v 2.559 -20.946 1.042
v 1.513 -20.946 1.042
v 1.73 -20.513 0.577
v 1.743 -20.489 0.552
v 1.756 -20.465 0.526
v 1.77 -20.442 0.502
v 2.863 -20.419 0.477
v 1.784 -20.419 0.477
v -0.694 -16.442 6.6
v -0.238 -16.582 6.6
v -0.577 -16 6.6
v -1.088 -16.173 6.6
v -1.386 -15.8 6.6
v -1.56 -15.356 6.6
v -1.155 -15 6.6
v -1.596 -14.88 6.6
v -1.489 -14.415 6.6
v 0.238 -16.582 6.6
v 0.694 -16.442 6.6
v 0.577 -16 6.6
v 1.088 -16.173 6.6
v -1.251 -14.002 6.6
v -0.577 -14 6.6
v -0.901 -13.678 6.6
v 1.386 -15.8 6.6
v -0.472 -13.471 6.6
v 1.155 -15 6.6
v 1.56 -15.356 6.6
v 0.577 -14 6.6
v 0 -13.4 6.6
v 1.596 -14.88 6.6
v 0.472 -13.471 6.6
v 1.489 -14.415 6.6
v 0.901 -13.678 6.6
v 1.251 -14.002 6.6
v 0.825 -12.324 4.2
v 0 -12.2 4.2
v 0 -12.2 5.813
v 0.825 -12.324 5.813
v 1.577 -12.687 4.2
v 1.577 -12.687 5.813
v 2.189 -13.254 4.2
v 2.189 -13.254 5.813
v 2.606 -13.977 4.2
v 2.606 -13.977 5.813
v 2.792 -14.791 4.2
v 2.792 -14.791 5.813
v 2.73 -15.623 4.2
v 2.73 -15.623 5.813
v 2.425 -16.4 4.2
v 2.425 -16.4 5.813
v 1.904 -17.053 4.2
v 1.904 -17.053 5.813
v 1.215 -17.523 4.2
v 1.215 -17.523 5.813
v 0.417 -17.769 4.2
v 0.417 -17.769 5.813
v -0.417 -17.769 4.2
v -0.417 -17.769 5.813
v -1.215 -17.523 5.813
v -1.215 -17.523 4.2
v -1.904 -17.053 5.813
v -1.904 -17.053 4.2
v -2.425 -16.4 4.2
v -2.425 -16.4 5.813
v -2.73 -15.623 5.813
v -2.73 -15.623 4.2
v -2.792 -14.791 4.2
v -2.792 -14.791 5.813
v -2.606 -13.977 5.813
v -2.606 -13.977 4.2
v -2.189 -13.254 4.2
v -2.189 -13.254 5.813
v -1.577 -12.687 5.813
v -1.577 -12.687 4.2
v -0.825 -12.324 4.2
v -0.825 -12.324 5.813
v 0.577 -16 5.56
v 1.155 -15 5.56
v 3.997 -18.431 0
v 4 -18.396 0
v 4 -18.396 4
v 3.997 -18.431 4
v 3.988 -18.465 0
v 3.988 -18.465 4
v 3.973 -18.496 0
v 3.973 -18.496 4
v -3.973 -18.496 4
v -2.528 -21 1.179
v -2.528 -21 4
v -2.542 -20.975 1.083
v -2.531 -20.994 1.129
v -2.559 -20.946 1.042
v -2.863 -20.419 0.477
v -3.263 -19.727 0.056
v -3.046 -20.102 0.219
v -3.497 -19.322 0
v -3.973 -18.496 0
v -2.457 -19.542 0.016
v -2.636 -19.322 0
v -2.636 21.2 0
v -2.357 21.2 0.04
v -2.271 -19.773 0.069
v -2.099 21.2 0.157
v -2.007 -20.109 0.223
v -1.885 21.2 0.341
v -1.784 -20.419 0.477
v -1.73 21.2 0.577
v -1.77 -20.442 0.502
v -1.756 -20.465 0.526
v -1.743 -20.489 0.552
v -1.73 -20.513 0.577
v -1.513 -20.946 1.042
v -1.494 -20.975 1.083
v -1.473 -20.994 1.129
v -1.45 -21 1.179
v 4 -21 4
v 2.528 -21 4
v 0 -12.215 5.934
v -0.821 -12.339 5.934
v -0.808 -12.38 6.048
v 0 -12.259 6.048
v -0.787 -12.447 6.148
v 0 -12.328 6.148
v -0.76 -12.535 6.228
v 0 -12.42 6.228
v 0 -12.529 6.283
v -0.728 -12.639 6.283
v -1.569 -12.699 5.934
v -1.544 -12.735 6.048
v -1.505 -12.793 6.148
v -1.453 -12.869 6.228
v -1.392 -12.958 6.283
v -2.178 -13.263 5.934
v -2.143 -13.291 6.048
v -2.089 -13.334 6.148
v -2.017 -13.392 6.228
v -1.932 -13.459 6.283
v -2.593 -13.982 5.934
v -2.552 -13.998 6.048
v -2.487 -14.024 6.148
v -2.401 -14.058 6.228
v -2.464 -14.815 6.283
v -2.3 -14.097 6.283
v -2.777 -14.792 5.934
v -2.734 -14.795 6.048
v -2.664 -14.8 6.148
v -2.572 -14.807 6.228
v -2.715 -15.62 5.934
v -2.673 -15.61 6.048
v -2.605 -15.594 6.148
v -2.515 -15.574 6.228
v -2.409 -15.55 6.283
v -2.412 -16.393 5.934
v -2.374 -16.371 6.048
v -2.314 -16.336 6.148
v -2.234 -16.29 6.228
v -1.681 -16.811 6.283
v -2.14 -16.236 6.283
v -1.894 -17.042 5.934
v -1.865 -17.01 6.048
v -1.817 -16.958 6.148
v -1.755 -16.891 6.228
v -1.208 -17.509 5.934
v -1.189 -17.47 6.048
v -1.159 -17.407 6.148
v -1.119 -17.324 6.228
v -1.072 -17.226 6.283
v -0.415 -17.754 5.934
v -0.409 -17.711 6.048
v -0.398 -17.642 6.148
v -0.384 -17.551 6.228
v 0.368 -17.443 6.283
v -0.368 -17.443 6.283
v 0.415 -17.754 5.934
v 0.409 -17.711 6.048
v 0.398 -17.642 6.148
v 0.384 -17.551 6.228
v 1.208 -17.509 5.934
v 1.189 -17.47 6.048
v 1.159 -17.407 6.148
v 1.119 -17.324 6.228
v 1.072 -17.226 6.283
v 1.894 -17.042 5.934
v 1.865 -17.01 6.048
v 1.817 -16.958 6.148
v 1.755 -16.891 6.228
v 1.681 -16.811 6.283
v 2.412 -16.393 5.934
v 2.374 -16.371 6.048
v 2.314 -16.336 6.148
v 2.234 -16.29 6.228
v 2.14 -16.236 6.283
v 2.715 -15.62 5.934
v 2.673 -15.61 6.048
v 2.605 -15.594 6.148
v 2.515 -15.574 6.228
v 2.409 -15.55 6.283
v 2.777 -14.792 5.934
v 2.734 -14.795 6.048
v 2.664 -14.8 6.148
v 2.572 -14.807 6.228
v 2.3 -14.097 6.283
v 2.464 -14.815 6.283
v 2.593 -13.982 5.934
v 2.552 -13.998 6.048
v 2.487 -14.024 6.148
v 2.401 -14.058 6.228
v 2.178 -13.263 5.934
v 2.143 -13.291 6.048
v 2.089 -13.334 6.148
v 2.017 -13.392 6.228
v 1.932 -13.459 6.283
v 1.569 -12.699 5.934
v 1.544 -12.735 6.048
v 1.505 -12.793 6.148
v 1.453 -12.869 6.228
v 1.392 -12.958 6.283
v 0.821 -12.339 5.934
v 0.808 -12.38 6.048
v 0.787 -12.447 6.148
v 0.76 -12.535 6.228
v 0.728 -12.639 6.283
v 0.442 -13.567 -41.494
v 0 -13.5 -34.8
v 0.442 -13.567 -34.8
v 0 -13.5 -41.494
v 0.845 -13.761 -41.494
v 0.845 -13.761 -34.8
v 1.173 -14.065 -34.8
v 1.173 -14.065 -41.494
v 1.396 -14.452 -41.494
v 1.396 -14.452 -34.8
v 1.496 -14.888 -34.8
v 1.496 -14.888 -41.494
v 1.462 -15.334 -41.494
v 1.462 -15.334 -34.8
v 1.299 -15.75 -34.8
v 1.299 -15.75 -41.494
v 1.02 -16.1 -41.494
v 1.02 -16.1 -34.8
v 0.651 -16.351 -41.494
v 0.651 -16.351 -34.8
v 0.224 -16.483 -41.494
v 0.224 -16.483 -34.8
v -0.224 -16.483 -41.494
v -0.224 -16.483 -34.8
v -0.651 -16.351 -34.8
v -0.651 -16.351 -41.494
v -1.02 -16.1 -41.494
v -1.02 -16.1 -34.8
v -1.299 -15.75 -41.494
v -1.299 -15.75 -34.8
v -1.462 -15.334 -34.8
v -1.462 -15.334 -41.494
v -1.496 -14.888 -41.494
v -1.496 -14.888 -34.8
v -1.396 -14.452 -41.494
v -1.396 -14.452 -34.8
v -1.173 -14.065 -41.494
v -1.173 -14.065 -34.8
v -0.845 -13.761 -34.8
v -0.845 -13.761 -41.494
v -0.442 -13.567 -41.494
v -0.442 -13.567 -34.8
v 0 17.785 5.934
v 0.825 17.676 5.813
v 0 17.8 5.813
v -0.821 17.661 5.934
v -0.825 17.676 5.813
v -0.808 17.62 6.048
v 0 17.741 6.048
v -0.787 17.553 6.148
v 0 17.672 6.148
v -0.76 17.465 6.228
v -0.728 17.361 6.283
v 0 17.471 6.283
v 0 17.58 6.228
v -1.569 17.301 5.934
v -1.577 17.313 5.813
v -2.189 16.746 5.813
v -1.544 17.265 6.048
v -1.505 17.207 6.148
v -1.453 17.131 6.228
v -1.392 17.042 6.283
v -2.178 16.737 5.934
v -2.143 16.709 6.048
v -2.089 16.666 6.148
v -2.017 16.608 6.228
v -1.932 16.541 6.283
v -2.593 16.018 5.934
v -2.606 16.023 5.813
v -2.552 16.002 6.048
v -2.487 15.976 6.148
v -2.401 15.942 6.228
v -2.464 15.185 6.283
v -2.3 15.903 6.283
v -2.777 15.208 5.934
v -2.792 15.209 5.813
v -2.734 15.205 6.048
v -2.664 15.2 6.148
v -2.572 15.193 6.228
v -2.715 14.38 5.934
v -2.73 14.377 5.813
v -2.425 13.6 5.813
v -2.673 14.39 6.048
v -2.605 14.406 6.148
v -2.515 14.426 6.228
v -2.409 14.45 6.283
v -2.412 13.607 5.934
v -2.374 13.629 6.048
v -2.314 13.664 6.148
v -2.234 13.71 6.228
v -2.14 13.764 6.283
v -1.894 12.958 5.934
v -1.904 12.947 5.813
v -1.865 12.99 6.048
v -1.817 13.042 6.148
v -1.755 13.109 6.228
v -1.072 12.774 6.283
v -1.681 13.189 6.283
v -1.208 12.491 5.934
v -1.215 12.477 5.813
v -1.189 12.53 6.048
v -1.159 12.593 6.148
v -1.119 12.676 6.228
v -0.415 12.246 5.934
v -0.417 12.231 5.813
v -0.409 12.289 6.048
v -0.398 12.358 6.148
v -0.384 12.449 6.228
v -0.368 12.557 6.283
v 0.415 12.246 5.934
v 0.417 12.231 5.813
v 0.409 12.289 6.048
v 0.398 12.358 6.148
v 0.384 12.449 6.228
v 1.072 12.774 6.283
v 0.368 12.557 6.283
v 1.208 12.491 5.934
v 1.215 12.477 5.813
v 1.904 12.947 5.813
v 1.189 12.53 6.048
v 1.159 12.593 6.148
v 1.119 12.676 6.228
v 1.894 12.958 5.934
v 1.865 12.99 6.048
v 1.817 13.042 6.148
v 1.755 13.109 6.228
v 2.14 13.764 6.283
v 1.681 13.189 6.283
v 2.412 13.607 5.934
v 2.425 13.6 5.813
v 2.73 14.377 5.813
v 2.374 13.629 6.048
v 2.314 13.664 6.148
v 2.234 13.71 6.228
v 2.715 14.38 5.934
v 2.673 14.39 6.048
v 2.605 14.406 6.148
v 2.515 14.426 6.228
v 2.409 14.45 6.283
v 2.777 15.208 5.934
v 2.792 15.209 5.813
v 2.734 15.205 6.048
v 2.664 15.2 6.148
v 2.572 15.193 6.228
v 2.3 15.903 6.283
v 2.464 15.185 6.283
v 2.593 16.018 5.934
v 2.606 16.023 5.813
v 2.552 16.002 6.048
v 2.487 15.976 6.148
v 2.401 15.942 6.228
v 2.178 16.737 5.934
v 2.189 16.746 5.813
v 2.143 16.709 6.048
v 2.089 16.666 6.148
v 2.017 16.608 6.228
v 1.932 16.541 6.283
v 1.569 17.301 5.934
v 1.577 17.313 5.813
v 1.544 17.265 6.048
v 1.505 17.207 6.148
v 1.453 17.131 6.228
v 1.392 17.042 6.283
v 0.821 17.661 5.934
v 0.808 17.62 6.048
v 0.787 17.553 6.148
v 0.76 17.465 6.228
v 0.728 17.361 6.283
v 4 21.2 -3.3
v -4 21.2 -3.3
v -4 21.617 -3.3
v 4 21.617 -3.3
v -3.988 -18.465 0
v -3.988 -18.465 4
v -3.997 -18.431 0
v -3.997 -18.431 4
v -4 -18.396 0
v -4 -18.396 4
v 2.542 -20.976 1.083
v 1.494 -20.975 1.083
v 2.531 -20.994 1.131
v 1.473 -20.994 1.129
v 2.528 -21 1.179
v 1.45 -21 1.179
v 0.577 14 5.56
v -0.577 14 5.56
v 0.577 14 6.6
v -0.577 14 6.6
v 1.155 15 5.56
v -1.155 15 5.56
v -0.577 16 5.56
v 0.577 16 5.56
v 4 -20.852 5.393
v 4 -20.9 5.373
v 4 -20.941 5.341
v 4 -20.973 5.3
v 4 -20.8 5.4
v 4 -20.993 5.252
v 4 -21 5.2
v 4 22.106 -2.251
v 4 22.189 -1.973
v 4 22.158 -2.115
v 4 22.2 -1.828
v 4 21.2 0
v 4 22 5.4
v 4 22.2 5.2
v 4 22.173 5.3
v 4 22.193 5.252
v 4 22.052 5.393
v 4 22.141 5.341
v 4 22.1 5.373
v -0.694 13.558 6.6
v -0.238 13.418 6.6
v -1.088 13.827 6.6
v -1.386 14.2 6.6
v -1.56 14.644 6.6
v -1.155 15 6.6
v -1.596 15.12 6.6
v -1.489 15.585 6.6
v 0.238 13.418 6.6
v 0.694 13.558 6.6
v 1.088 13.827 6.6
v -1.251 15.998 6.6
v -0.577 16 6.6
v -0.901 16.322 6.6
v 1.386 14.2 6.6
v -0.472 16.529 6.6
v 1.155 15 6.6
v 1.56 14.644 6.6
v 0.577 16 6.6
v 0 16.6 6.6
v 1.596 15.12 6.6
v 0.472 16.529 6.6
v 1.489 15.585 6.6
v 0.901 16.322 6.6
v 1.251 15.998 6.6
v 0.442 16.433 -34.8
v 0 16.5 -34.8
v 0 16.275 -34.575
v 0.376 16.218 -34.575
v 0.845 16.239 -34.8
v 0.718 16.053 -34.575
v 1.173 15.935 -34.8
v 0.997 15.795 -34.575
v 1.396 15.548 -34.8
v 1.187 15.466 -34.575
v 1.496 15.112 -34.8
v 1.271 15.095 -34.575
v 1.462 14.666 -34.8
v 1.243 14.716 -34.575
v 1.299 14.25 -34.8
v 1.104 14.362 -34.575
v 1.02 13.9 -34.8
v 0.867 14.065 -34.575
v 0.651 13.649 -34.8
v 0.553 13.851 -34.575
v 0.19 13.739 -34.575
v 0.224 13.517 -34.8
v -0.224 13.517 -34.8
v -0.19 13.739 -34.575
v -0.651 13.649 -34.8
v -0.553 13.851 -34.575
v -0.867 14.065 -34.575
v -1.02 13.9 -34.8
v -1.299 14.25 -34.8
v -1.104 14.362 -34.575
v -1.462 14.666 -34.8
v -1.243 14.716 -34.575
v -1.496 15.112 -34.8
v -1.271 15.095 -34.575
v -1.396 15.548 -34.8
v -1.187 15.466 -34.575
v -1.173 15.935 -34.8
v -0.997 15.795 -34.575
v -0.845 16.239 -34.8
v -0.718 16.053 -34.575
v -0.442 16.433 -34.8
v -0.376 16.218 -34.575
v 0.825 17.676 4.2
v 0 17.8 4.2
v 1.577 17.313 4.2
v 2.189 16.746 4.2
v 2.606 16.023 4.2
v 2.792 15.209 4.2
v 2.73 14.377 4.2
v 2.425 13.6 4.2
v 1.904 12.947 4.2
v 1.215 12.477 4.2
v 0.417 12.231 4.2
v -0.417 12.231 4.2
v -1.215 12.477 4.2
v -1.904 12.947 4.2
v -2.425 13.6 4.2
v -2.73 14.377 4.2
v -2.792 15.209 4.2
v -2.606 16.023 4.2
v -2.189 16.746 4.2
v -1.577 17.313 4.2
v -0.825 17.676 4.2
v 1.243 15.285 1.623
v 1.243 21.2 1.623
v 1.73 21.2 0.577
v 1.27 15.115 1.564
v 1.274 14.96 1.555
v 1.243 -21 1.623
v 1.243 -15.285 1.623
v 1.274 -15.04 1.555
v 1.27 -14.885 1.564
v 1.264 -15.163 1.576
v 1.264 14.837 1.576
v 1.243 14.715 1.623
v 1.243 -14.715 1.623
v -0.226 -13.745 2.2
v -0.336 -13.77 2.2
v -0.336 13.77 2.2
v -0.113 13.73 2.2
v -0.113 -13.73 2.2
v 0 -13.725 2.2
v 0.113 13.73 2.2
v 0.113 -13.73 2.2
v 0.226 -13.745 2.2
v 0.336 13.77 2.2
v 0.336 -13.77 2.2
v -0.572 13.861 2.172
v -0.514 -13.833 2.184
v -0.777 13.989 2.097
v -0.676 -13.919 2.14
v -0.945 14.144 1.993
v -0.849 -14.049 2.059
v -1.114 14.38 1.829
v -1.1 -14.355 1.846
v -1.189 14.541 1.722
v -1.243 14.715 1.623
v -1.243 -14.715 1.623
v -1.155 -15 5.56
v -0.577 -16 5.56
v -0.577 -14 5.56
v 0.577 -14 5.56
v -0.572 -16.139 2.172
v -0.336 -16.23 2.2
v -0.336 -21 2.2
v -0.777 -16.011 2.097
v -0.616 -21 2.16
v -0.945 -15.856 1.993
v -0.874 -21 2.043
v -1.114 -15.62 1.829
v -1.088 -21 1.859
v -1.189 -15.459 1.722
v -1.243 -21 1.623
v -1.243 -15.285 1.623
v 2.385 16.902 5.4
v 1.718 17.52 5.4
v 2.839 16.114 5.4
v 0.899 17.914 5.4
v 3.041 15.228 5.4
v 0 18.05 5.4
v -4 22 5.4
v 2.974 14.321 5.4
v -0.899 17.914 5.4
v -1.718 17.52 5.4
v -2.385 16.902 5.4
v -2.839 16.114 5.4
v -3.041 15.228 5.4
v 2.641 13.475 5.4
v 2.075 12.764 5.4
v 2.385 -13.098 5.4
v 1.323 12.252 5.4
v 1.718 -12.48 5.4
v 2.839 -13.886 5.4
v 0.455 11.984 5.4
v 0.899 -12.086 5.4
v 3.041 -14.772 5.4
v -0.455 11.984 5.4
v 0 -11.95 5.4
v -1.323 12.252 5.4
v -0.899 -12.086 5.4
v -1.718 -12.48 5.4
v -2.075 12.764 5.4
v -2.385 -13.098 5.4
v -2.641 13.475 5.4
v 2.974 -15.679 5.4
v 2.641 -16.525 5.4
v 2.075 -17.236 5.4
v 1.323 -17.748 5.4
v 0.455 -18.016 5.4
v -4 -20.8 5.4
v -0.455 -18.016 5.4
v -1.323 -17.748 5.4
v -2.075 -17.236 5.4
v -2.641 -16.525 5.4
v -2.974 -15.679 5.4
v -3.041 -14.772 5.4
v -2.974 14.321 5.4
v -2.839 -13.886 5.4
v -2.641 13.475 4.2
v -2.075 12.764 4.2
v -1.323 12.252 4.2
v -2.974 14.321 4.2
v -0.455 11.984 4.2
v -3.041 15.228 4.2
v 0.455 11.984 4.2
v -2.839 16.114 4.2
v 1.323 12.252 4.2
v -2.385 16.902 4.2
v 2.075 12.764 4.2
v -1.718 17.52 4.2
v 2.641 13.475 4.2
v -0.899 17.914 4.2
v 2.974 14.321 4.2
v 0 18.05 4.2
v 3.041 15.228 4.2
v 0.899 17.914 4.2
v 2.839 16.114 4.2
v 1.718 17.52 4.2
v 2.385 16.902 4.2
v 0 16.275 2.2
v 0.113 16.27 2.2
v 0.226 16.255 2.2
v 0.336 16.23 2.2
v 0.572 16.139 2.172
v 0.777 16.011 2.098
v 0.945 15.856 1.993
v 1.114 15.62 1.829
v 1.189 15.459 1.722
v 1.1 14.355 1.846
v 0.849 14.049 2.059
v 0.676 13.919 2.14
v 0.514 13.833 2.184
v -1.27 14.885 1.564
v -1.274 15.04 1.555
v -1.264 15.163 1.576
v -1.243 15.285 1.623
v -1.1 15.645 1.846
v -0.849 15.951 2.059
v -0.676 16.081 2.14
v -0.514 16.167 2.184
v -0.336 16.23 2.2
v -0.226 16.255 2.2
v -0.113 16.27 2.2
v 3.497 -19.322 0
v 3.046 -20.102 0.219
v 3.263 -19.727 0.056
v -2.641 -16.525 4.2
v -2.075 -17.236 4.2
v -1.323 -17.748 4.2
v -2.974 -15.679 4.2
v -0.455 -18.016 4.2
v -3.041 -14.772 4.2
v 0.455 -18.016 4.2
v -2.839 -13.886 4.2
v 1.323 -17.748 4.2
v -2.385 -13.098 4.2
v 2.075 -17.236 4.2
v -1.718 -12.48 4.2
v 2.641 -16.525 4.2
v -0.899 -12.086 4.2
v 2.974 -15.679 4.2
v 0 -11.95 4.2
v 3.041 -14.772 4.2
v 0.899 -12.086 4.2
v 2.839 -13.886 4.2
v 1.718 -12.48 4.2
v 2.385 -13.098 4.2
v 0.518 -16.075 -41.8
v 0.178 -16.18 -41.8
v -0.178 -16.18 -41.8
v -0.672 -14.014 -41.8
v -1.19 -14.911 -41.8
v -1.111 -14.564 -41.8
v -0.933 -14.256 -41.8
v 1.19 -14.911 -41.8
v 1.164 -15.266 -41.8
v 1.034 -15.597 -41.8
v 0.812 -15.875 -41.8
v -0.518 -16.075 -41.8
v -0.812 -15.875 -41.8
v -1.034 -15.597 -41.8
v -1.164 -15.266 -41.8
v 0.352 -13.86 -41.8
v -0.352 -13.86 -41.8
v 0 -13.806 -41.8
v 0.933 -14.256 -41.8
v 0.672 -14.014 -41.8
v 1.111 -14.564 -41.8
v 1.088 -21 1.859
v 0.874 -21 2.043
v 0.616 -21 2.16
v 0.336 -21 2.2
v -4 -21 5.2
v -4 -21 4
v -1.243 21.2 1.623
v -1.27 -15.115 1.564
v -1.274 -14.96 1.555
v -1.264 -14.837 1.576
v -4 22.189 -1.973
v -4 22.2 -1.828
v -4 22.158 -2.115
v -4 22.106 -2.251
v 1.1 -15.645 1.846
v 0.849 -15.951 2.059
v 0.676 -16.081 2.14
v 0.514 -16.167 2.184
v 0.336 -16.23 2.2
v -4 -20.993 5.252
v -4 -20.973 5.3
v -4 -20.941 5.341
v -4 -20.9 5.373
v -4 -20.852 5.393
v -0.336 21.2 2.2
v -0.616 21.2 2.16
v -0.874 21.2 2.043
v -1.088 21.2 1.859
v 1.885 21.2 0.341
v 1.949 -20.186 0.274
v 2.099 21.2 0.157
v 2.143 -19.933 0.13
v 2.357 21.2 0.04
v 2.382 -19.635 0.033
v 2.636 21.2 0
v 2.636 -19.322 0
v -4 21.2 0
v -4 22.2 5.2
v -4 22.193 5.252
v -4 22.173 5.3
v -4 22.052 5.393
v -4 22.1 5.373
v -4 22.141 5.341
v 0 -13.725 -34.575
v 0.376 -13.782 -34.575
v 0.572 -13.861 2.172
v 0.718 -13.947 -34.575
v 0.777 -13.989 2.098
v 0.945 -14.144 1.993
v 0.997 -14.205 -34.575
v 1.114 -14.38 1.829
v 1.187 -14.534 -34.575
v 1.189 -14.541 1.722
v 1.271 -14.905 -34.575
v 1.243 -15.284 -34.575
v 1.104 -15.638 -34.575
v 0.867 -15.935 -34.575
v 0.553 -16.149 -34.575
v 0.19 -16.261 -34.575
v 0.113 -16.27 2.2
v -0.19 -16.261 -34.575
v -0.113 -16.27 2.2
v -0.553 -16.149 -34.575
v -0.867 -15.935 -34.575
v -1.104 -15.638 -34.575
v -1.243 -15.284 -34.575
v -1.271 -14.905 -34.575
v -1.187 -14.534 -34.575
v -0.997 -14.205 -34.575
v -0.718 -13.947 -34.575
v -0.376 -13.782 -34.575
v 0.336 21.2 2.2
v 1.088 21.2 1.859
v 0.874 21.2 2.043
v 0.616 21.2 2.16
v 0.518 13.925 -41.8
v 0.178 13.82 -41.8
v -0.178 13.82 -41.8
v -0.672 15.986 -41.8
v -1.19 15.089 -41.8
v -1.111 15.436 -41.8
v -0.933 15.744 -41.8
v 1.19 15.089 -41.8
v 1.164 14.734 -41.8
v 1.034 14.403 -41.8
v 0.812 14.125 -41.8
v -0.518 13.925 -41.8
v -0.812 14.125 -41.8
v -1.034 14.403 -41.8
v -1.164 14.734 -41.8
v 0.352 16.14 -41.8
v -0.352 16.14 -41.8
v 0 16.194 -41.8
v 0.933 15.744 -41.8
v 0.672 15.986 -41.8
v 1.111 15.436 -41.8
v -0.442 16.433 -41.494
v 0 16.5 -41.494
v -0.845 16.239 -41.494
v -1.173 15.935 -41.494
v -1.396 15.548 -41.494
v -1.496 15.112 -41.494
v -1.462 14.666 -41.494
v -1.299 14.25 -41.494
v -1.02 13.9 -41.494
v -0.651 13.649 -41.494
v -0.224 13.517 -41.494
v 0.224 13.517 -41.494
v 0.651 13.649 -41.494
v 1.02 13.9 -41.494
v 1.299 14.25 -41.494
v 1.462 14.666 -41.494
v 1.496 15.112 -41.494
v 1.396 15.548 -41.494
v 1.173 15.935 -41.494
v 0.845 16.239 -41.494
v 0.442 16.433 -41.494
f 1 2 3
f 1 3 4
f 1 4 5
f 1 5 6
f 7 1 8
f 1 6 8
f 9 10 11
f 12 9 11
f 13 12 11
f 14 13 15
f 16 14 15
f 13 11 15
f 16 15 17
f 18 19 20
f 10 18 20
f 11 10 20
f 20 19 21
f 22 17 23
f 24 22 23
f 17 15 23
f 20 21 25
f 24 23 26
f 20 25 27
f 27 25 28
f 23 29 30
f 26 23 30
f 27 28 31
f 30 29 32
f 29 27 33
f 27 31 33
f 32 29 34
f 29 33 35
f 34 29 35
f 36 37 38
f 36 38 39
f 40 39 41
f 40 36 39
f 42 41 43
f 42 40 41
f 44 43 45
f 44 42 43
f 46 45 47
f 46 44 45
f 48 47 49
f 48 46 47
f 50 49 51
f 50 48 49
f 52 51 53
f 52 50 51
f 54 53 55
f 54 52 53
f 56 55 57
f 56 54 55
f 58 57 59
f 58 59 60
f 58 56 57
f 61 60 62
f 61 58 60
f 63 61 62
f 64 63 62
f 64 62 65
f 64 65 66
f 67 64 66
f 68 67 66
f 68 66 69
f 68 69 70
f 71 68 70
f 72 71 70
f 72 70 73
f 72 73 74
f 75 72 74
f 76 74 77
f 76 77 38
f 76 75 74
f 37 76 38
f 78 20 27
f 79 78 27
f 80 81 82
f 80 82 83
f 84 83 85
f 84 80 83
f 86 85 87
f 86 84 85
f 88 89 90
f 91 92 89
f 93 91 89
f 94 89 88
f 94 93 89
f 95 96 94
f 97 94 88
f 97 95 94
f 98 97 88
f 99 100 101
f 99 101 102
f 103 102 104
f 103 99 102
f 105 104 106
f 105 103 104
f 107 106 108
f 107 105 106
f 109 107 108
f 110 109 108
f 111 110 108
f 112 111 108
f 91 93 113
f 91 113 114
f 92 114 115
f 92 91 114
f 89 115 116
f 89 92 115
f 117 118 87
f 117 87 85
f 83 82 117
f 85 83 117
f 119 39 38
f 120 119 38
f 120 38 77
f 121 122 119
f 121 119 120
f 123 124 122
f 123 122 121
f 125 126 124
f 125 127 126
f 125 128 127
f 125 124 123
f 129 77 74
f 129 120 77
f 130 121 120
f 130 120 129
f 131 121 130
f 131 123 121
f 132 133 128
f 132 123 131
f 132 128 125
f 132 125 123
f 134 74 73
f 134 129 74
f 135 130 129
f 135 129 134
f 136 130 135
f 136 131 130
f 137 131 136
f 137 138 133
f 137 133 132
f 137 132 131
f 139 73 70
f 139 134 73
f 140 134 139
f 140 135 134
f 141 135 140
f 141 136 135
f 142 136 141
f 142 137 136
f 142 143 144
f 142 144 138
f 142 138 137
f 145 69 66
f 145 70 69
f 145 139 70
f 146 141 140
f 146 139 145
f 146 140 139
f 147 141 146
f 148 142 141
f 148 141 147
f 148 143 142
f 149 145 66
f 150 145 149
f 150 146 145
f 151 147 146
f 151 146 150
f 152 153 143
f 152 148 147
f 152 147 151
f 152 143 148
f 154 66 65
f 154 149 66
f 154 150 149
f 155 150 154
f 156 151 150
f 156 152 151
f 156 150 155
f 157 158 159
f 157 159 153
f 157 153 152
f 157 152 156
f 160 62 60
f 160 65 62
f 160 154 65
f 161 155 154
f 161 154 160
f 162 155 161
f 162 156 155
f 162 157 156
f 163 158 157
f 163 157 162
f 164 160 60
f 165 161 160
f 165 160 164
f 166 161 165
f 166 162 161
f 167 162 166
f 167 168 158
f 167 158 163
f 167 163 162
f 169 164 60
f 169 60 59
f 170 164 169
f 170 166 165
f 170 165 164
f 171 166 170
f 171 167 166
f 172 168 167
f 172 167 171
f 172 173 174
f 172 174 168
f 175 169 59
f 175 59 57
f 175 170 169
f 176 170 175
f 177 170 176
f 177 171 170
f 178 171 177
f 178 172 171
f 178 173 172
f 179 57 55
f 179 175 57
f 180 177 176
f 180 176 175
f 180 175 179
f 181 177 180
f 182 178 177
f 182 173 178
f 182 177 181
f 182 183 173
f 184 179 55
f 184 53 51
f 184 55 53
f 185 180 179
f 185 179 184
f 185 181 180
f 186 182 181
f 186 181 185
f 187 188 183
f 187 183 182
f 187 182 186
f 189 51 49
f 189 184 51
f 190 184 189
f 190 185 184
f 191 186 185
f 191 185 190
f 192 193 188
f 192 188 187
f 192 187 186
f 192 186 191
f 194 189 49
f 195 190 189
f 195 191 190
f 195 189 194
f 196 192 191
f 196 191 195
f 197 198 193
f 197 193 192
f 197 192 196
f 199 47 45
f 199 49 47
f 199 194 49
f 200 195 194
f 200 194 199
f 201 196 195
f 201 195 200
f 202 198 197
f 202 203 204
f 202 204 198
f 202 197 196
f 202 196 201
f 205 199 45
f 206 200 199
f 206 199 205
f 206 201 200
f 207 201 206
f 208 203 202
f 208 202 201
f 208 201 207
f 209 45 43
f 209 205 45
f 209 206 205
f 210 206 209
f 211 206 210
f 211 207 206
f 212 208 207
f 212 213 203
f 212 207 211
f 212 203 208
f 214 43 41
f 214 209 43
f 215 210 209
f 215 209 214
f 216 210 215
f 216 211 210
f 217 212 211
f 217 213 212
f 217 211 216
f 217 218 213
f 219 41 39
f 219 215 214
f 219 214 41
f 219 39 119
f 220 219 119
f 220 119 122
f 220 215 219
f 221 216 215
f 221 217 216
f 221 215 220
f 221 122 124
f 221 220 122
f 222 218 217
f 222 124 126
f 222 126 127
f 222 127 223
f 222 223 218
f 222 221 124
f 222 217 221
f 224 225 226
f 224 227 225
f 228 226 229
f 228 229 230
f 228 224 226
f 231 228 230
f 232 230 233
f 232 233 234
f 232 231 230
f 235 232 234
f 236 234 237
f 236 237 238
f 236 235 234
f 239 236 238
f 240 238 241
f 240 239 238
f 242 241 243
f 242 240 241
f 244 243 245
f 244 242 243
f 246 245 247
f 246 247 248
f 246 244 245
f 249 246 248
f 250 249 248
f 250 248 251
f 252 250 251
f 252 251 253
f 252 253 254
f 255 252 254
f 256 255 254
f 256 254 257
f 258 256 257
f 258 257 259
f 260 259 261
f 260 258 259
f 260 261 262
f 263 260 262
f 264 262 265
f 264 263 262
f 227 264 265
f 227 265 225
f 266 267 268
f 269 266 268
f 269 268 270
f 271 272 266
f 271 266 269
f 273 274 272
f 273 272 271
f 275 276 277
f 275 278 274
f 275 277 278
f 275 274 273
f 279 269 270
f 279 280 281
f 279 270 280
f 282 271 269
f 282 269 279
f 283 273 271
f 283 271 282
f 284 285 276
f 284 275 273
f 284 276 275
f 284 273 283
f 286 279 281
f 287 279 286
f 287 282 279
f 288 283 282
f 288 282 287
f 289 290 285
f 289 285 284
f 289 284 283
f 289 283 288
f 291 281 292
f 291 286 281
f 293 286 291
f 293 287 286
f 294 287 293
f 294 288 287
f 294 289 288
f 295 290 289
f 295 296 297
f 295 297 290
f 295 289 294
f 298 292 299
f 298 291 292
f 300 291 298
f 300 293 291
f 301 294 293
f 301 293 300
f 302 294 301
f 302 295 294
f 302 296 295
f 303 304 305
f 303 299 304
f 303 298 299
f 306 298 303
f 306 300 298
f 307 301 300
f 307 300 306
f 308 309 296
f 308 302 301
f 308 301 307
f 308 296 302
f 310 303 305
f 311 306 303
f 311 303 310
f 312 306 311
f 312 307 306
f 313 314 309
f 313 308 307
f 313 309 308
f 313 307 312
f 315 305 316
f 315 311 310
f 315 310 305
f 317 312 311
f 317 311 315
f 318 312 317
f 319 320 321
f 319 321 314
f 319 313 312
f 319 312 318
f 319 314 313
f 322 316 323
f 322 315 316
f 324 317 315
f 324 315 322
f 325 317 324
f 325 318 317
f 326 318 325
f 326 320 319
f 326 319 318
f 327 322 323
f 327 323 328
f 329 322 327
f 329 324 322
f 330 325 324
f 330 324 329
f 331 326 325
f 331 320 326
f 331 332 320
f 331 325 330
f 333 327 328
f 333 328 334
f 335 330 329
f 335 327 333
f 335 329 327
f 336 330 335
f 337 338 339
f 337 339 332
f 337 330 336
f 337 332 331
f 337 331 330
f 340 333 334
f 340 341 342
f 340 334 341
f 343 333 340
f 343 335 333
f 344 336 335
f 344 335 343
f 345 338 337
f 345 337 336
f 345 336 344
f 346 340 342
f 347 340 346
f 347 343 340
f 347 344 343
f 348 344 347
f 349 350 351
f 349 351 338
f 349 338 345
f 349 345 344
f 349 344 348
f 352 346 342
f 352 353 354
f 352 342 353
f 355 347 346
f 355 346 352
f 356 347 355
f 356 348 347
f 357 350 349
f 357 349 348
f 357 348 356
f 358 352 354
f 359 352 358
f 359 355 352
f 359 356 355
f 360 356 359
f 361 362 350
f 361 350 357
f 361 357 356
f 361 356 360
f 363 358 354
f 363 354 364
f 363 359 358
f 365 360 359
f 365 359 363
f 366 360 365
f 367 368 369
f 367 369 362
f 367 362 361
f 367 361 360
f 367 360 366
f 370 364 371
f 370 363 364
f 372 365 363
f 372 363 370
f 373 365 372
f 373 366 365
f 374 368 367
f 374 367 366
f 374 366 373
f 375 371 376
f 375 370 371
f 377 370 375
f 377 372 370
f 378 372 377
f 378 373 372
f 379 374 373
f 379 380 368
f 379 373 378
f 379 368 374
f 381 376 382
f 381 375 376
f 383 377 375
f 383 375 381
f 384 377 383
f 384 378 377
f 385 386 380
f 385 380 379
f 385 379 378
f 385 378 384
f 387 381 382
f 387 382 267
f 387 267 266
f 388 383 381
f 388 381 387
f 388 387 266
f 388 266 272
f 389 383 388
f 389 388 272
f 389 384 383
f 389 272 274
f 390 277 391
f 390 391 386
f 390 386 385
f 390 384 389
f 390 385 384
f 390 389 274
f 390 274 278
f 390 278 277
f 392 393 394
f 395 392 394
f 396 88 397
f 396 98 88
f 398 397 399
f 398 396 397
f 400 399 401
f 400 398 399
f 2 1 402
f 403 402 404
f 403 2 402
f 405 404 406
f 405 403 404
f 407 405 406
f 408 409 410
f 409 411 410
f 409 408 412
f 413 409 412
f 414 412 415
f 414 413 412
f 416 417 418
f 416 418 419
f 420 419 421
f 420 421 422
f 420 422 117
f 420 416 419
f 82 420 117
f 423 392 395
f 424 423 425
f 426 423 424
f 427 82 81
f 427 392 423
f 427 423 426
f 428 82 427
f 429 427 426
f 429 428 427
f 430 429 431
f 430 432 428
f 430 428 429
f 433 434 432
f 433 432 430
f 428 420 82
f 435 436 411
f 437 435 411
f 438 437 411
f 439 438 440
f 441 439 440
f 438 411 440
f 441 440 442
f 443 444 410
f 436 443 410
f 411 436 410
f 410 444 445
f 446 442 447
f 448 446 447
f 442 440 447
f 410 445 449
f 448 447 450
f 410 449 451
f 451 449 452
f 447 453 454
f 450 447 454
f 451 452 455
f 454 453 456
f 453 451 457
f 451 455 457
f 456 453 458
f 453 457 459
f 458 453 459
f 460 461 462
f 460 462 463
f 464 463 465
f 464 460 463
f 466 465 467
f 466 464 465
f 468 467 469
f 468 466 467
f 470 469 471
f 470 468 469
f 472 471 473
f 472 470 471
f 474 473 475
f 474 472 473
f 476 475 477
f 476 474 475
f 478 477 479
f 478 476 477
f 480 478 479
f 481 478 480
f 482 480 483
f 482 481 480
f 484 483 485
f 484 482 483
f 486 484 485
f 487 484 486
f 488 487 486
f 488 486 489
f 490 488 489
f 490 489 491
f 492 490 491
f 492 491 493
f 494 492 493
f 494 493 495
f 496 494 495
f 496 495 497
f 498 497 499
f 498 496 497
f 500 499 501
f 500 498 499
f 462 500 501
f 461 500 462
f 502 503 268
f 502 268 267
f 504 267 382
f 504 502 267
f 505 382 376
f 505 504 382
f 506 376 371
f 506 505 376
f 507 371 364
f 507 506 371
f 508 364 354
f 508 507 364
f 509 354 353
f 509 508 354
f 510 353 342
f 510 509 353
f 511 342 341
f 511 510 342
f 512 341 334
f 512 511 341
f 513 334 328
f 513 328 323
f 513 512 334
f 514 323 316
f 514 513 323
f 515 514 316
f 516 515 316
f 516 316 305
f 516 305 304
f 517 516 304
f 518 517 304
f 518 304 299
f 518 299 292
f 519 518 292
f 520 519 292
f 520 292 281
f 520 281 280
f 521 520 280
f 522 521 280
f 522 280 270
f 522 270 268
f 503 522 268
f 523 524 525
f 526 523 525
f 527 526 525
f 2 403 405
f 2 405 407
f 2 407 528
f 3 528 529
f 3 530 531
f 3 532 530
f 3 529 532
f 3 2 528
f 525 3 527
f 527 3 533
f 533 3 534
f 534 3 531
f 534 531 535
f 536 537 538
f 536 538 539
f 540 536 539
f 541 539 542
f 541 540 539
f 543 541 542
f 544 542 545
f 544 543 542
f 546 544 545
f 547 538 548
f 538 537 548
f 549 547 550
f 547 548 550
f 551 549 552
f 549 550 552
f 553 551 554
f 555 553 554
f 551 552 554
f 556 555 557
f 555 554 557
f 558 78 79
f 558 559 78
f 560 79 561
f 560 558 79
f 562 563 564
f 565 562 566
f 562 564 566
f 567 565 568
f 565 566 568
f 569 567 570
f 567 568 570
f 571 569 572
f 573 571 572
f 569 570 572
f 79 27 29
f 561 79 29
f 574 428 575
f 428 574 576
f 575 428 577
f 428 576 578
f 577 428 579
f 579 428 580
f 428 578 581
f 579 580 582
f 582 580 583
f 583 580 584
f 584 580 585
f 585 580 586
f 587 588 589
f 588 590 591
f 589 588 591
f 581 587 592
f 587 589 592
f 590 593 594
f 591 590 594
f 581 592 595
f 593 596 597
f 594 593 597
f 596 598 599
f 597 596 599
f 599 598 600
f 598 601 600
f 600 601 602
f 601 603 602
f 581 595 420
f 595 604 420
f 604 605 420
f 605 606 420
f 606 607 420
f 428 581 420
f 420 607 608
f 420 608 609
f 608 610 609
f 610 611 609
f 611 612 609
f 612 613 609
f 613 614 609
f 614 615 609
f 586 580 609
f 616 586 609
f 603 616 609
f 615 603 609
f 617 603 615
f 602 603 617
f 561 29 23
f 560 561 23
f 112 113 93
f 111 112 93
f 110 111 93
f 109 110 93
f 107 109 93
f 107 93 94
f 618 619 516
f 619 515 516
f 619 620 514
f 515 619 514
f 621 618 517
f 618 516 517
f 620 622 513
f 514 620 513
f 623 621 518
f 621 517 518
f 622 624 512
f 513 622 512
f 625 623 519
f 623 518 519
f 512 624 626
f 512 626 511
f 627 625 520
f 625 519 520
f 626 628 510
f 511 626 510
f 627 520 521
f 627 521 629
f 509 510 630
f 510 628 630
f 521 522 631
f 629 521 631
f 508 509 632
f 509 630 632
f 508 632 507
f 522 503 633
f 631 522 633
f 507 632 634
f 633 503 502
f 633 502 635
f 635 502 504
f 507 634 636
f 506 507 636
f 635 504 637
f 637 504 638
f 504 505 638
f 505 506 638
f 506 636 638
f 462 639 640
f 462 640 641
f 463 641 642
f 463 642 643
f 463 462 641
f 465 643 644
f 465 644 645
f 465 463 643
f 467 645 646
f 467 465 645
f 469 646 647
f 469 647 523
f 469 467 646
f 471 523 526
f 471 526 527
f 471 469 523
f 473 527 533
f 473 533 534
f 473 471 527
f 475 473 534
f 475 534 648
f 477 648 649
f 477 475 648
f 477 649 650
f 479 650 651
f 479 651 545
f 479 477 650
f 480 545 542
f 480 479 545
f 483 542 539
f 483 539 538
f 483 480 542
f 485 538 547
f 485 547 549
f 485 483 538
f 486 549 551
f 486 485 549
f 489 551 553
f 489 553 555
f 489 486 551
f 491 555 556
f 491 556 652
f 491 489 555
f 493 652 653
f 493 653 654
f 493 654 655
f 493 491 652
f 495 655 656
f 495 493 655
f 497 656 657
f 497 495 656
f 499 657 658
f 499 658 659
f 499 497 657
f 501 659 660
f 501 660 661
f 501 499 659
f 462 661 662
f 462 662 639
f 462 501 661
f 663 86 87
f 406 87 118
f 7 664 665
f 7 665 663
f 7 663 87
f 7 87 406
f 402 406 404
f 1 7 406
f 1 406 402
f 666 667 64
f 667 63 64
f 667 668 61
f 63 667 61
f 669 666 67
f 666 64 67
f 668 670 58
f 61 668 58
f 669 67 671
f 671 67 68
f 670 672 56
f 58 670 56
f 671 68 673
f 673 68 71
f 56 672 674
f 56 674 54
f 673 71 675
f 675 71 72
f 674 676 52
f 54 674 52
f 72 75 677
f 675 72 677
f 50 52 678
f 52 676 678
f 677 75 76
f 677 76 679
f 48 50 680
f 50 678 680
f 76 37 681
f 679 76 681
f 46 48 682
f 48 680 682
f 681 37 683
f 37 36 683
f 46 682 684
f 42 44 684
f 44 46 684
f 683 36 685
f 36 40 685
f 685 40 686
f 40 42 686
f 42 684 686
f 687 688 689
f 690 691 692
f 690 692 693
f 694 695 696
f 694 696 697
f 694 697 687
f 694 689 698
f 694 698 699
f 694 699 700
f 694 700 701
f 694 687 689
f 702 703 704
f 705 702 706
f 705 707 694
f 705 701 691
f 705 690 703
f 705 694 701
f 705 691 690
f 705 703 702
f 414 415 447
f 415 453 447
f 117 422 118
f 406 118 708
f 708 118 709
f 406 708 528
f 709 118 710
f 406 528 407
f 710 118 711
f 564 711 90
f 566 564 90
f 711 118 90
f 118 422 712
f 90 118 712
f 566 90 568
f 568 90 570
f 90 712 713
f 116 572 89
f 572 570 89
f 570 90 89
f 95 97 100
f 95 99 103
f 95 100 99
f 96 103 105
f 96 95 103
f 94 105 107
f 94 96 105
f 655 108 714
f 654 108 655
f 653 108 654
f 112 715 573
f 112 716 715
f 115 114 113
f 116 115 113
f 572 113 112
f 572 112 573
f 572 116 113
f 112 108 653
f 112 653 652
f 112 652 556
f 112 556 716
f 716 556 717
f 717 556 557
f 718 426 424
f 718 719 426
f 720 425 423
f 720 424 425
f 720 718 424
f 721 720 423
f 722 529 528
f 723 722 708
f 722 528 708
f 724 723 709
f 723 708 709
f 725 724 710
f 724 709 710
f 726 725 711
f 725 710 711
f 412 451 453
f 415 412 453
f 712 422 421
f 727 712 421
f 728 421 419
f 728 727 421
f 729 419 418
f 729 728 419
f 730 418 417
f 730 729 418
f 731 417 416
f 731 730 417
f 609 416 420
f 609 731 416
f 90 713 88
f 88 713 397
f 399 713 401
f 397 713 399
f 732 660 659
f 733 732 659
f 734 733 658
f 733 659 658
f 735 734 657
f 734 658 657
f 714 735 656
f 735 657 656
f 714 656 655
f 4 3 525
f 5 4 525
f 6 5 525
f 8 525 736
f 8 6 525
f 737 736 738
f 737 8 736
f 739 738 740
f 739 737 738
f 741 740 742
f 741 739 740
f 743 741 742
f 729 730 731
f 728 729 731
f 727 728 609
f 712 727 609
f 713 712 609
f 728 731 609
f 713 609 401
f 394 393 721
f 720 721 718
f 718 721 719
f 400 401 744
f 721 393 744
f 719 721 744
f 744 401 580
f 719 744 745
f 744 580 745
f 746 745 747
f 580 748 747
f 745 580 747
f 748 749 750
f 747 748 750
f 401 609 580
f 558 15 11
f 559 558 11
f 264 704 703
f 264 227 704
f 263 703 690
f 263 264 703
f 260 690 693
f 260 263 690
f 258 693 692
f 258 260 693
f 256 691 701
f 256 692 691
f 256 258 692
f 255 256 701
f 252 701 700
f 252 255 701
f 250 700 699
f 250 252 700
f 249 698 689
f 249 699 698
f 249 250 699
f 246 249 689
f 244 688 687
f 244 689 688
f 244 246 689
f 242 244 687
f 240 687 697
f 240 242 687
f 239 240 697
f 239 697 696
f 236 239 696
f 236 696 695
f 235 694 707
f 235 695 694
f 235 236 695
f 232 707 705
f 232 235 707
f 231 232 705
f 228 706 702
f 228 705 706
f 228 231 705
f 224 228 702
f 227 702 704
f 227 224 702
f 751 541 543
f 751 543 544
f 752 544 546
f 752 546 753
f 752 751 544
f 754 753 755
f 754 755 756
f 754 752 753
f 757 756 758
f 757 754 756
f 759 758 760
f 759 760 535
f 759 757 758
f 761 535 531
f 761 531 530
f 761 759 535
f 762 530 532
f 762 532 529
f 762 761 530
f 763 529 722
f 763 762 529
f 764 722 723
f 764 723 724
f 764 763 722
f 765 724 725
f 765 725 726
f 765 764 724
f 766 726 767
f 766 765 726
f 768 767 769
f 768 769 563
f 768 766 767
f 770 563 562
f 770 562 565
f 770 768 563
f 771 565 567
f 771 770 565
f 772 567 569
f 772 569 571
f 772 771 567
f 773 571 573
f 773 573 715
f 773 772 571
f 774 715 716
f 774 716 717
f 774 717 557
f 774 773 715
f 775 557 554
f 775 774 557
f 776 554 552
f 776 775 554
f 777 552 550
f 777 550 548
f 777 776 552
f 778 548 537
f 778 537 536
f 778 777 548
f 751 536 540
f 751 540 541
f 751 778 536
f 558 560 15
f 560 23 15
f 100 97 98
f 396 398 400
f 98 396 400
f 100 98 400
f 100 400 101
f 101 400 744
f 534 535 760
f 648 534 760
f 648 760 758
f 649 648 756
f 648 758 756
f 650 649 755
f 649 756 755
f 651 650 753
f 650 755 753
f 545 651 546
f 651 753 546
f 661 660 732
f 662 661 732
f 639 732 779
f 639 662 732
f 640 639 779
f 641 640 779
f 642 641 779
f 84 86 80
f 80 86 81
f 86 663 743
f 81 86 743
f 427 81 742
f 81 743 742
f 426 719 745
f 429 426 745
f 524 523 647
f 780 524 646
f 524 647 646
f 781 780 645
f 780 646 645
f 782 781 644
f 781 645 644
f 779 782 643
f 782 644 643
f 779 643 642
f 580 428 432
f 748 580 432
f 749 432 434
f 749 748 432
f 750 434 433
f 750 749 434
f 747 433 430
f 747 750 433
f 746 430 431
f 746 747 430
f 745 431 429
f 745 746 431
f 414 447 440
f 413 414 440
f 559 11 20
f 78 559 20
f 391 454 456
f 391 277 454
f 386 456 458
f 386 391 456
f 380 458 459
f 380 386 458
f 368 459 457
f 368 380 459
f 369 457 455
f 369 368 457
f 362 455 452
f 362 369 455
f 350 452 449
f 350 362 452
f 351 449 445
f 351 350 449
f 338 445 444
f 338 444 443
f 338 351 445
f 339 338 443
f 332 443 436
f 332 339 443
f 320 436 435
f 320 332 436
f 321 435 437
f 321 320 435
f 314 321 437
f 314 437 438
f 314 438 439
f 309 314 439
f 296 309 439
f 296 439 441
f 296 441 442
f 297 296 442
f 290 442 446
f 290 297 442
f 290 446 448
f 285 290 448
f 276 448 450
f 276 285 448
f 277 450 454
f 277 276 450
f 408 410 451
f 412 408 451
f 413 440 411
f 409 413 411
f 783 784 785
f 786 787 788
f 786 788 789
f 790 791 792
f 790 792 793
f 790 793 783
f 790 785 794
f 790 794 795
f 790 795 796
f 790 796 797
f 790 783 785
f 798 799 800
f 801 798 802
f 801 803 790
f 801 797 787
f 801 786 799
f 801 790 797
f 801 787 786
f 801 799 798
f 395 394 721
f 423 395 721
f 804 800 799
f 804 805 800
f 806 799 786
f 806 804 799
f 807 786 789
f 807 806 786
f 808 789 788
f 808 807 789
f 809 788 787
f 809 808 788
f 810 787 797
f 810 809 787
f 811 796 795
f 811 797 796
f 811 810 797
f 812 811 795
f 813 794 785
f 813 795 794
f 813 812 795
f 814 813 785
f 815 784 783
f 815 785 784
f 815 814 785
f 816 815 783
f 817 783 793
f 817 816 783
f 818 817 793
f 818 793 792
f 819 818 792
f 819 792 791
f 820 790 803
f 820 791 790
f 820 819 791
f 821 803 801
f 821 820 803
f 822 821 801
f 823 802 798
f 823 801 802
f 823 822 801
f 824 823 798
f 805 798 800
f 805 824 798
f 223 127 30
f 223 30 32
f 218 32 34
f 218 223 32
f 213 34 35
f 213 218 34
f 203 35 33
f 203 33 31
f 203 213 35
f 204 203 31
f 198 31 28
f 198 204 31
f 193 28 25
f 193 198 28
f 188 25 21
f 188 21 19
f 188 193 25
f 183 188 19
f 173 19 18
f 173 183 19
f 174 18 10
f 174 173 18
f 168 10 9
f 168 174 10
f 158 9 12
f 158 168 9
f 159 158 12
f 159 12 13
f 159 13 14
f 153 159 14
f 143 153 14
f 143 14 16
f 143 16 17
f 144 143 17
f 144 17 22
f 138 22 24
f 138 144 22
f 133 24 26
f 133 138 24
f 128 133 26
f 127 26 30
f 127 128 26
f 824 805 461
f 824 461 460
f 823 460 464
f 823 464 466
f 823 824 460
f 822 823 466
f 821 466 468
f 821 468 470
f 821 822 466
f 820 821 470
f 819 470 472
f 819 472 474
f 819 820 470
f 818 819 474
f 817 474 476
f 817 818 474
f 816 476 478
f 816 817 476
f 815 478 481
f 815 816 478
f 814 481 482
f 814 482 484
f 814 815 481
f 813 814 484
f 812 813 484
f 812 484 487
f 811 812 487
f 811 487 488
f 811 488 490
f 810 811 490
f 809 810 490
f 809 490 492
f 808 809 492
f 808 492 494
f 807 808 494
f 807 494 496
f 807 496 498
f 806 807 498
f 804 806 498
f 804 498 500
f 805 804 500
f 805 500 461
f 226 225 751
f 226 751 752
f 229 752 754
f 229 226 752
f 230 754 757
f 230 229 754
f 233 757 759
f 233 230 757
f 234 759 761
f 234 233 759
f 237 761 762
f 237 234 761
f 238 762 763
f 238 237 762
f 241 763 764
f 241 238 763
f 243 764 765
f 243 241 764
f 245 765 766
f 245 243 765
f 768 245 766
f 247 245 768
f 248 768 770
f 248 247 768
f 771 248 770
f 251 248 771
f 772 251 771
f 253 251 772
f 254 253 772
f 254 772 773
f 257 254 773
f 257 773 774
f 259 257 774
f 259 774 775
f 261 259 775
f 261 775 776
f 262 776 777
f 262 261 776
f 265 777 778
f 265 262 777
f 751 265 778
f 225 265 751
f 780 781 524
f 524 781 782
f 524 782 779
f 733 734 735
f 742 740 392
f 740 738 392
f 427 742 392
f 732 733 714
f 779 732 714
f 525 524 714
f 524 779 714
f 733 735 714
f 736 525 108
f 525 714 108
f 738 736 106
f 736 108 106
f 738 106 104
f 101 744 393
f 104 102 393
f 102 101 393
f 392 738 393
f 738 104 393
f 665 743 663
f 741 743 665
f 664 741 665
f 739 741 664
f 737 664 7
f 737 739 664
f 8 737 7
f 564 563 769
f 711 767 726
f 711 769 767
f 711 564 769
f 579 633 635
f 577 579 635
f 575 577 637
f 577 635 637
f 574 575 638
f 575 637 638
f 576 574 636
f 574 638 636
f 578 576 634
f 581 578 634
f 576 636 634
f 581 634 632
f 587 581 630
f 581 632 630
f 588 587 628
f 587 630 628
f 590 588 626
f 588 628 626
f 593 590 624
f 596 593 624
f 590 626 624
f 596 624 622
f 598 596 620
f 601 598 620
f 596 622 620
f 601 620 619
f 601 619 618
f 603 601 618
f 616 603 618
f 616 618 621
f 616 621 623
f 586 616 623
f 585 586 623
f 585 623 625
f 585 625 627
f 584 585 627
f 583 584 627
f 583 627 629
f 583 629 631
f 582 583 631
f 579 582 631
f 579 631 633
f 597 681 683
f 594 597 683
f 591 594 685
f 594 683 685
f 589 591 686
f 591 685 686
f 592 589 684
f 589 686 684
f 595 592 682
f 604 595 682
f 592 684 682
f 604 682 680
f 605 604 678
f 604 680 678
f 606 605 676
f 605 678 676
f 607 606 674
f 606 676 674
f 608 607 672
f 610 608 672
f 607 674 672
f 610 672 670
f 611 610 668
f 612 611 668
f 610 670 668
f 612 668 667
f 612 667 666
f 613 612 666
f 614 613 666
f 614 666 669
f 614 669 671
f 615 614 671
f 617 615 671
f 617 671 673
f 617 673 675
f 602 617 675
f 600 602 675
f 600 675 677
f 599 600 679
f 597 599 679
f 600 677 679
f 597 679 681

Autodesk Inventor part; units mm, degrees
sketch "Sketch_1" plane through (0, 0, 0) normal (1, 0, 0) x (0, 1, 0)
  line L0 (22, 5.4) -> (-20.8, 5.4)
  arc A0 (-20.8, 5.4) -> (-21, 5.2) centre (-20.8, 5.2) ccw
  line L1 (-21, 5.2) -> (-21, 1.1788)
  arc A1 (-21, 1.1788) -> (-20.9463, 1.0424) centre (-20.8, 1.1788) ccw
  line L2 (-20.9463, 1.0424) -> (-20.419, 0.477)
  arc A2 (-20.419, 0.477) -> (-19.322, 0) centre (-19.322, 1.5) ccw
  line L3 (-19.322, 0) -> (21.2, 0)
  line L4 (21.2, 0) -> (21.2, -3.3)
  line L5 (21.2, -3.3) -> (21.6171, -3.3)
  line L6 (21.6171, -3.3) -> (22.1063, -2.2509)
  arc A3 (22.1063, -2.2509) -> (22.2, -1.8283) centre (21.2, -1.8283) ccw
  line L7 (22.2, -1.8283) -> (22.2, 5.2)
  arc A4 (22.2, 5.2) -> (22, 5.4) centre (22, 5.2) ccw
extrude "Extrusion1" add sketch "Sketch_1" along normal mid plane 8
sketch "Sketch_2" plane through (0, 0, 0) normal (1, 0, 0) x (0, 1, 0)
  line L0 (15, 4.2) -> (15, 5.4)
  line L1 (15, 5.4) -> (18.05, 5.4)
  line L2 (18.05, 5.4) -> (18.05, 4.2)
  line L3 (18.05, 4.2) -> (15, 4.2)
  line L4 (15, 4.2) -> (15, 5.4)
revolve "Revolution1" cut sketch "Sketch_2" angle 360 about axis through (0, 15, 4.2) along (0, 0, -1)
sketch "Sketch_3" plane through (0, 0, 0) normal (1, 0, 0) x (0, 1, 0)
  line L0 (-15, 4.2) -> (-15, 5.4)
  line L1 (-15, 5.4) -> (-11.95, 5.4)
  line L2 (-11.95, 5.4) -> (-11.95, 4.2)
  line L3 (-11.95, 4.2) -> (-15, 4.2)
  line L4 (-15, 4.2) -> (-15, 5.4)
revolve "Revolution2" cut sketch "Sketch_3" angle 360 about axis through (0, -15, 4.2) along (0, 0, -1)
sketch "Sketch_6" plane through (0, -21.6, 0) normal (0, 1, 0) x (1, 0, 0)
  arc A0 (-1.7301, -0.5774) -> (-2.6364, 0) centre (-2.6364, -1) ccw
  line L0 (-1.7301, -0.5774) -> (-1.2427, -1.6226)
  arc A1 (-1.2427, -1.6226) -> (-0.3364, -2.2) centre (-0.3364, -1.2) ccw
  line L1 (-0.3364, -2.2) -> (0.3364, -2.2)
  arc A2 (0.3364, -2.2) -> (1.2427, -1.6226) centre (0.3364, -1.2) ccw
  line L2 (1.2427, -1.6226) -> (1.7301, -0.5774)
  arc A3 (2.6364, 0) -> (1.7301, -0.5774) centre (2.6364, -1) ccw
  line L3 (2.6364, 0) -> (-2.6364, 0)
extrude "Extrusion2" cut sketch "Sketch_6" along normal blind 42.8
sketch "Sketch_4" plane through (0, 0, 0) normal (1, 0, 0) x (0, 1, 0)
  line L0 (15, -41.8) -> (15, 6.6)
  line L1 (15, 6.6) -> (16.6, 6.6)
  line L2 (16.6, 6.6) -> (17.471, 6.283)
  arc A0 (17.8, 5.8131) -> (17.471, 6.283) centre (17.3, 5.8131) ccw
  line L3 (17.8, 5.8131) -> (17.8, 4.2)
  line L4 (17.8, 4.2) -> (16.275, 4.2)
  line L5 (16.275, 4.2) -> (16.275, -34.575)
  line L6 (16.275, -34.575) -> (16.5, -34.8)
  line L7 (16.5, -34.8) -> (16.5, -41.4935)
  line L8 (16.5, -41.4935) -> (16.1935, -41.8)
  line L9 (16.1935, -41.8) -> (15, -41.8)
  line L10 (15, -41.8) -> (15, 6.6)
revolve "Revolution3" add sketch "Sketch_4" angle 360 about axis through (0, 15, -41.8) along (0, 0, -1)
thread "Thread1" size "M3x0.5" class "6g" standard "ISO Metric profile" full length
sketch "Sketch_5" plane through (0, 0, 0) normal (1, 0, 0) x (0, 1, 0)
  line L0 (-15, -41.8) -> (-15, 6.6)
  line L1 (-15, 6.6) -> (-13.4, 6.6)
  line L2 (-13.4, 6.6) -> (-12.529, 6.283)
  arc A0 (-12.2, 5.8131) -> (-12.529, 6.283) centre (-12.7, 5.8131) ccw
  line L3 (-12.2, 5.8131) -> (-12.2, 4.2)
  line L4 (-12.2, 4.2) -> (-13.725, 4.2)
  line L5 (-13.725, 4.2) -> (-13.725, -34.575)
  line L6 (-13.725, -34.575) -> (-13.5, -34.8)
  line L7 (-13.5, -34.8) -> (-13.5, -41.4935)
  line L8 (-13.5, -41.4935) -> (-13.8065, -41.8)
  line L9 (-13.8065, -41.8) -> (-15, -41.8)
  line L10 (-15, -41.8) -> (-15, 6.6)
revolve "Revolution4" add sketch "Sketch_5" angle 360 about axis through (0, -15, -41.8) along (0, 0, -1)
thread "Thread2" size "M3x0.5" class "6g" standard "ISO Metric profile" full length
sketch "Sketch_7" plane through (0, 15, 6.6) normal (0, 0, 1) x (0, 1, 0)
  line L0 (-1, -0.5774) -> (0, -1.1547)
  line L1 (0, -1.1547) -> (1, -0.5774)
  line L2 (1, -0.5774) -> (1, 0.5774)
  line L3 (1, 0.5774) -> (0, 1.1547)
  line L4 (0, 1.1547) -> (-1, 0.5774)
  line L5 (-1, 0.5774) -> (-1, -0.5774)
extrude "Extrusion3" cut sketch "Sketch_7" against normal blind 1.04
sketch "Sketch_8" plane through (0, -15, 6.6) normal (0, 0, 1) x (0, 1, 0)
  line L0 (-1, -0.5774) -> (0, -1.1547)
  line L1 (0, -1.1547) -> (1, -0.5774)
  line L2 (1, -0.5774) -> (1, 0.5774)
  line L3 (1, 0.5774) -> (0, 1.1547)
  line L4 (0, 1.1547) -> (-1, 0.5774)
  line L5 (-1, 0.5774) -> (-1, -0.5774)
extrude "Extrusion4" cut sketch "Sketch_8" against normal blind 1.04
sketch "Sketch_9" plane through (0, 0, 0) normal (0, 0, 1) x (1, 0, 0)
  line L0 (-5, -18.3964) -> (-5, -23.2)
  line L1 (-5, -23.2) -> (5, -23.2)
  line L2 (5, -23.2) -> (5, -18.3964)
  line L3 (5, -18.3964) -> (4, -18.3964)
  arc A0 (3.9732, -18.4964) -> (4, -18.3964) centre (3.8, -18.3964) ccw
  line L4 (3.9732, -18.4964) -> (1.8927, -22.1)
  arc A1 (1.7195, -22.2) -> (1.8927, -22.1) centre (1.7195, -22) ccw
  line L5 (1.7195, -22.2) -> (-1.7195, -22.2)
  arc A2 (-1.8927, -22.1) -> (-1.7195, -22.2) centre (-1.7195, -22) ccw
  line L6 (-1.8927, -22.1) -> (-3.9732, -18.4964)
  arc A3 (-4, -18.3964) -> (-3.9732, -18.4964) centre (-3.8, -18.3964) ccw
  line L7 (-4, -18.3964) -> (-5, -18.3964)
extrude "Extrusion5" cut sketch "Sketch_9" along normal blind 4
ref_plane "ANBAU_XY" through (0, 0, -15.2) normal (0, -1, 0) x (1, 0, 0)
ref_plane "ANBAU_YZ" through (0, 0, -15.2) normal (1, 0, 0) x (0, 0, 1)
ref_plane "ANBAU_ZX" through (0, 0, -15.2) normal (0, 0, 1) x (0, -1, 0)
ref_plane "ANBAU_2_XY" through (0, 0, -15.2) normal (1, 0, 0) x (0, 0, -1)
ref_plane "ANBAU_2_YZ" through (0, 0, -15.2) normal (0, 0, -1) x (0, 1, 0)
ref_plane "ANBAU_2_ZX" through (0, 0, -15.2) normal (0, 1, 0) x (1, 0, 0)
ref_plane "IP_ANBAU_XY" through (0, 0, 0) normal (0, 0, -1) x (1, 0, 0)
ref_plane "IP_ANBAU_YZ" through (0, 0, 0) normal (1, 0, 0) x (0, -1, 0)
ref_plane "IP_ANBAU_ZX" through (0, 0, 0) normal (0, -1, 0) x (0, 0, -1)
ref_plane "IP_ANBAU_2_XY" through (0, 0, -15.2) normal (1, 0, 0) x (0, 0, -1)
ref_plane "IP_ANBAU_2_YZ" through (0, 0, -15.2) normal (0, 0, -1) x (0, 1, 0)
ref_plane "IP_ANBAU_2_ZX" through (0, 0, -15.2) normal (0, 1, 0) x (1, 0, 0)
properties part number "8092760 MS4-MV-B---(46_high_m)"
